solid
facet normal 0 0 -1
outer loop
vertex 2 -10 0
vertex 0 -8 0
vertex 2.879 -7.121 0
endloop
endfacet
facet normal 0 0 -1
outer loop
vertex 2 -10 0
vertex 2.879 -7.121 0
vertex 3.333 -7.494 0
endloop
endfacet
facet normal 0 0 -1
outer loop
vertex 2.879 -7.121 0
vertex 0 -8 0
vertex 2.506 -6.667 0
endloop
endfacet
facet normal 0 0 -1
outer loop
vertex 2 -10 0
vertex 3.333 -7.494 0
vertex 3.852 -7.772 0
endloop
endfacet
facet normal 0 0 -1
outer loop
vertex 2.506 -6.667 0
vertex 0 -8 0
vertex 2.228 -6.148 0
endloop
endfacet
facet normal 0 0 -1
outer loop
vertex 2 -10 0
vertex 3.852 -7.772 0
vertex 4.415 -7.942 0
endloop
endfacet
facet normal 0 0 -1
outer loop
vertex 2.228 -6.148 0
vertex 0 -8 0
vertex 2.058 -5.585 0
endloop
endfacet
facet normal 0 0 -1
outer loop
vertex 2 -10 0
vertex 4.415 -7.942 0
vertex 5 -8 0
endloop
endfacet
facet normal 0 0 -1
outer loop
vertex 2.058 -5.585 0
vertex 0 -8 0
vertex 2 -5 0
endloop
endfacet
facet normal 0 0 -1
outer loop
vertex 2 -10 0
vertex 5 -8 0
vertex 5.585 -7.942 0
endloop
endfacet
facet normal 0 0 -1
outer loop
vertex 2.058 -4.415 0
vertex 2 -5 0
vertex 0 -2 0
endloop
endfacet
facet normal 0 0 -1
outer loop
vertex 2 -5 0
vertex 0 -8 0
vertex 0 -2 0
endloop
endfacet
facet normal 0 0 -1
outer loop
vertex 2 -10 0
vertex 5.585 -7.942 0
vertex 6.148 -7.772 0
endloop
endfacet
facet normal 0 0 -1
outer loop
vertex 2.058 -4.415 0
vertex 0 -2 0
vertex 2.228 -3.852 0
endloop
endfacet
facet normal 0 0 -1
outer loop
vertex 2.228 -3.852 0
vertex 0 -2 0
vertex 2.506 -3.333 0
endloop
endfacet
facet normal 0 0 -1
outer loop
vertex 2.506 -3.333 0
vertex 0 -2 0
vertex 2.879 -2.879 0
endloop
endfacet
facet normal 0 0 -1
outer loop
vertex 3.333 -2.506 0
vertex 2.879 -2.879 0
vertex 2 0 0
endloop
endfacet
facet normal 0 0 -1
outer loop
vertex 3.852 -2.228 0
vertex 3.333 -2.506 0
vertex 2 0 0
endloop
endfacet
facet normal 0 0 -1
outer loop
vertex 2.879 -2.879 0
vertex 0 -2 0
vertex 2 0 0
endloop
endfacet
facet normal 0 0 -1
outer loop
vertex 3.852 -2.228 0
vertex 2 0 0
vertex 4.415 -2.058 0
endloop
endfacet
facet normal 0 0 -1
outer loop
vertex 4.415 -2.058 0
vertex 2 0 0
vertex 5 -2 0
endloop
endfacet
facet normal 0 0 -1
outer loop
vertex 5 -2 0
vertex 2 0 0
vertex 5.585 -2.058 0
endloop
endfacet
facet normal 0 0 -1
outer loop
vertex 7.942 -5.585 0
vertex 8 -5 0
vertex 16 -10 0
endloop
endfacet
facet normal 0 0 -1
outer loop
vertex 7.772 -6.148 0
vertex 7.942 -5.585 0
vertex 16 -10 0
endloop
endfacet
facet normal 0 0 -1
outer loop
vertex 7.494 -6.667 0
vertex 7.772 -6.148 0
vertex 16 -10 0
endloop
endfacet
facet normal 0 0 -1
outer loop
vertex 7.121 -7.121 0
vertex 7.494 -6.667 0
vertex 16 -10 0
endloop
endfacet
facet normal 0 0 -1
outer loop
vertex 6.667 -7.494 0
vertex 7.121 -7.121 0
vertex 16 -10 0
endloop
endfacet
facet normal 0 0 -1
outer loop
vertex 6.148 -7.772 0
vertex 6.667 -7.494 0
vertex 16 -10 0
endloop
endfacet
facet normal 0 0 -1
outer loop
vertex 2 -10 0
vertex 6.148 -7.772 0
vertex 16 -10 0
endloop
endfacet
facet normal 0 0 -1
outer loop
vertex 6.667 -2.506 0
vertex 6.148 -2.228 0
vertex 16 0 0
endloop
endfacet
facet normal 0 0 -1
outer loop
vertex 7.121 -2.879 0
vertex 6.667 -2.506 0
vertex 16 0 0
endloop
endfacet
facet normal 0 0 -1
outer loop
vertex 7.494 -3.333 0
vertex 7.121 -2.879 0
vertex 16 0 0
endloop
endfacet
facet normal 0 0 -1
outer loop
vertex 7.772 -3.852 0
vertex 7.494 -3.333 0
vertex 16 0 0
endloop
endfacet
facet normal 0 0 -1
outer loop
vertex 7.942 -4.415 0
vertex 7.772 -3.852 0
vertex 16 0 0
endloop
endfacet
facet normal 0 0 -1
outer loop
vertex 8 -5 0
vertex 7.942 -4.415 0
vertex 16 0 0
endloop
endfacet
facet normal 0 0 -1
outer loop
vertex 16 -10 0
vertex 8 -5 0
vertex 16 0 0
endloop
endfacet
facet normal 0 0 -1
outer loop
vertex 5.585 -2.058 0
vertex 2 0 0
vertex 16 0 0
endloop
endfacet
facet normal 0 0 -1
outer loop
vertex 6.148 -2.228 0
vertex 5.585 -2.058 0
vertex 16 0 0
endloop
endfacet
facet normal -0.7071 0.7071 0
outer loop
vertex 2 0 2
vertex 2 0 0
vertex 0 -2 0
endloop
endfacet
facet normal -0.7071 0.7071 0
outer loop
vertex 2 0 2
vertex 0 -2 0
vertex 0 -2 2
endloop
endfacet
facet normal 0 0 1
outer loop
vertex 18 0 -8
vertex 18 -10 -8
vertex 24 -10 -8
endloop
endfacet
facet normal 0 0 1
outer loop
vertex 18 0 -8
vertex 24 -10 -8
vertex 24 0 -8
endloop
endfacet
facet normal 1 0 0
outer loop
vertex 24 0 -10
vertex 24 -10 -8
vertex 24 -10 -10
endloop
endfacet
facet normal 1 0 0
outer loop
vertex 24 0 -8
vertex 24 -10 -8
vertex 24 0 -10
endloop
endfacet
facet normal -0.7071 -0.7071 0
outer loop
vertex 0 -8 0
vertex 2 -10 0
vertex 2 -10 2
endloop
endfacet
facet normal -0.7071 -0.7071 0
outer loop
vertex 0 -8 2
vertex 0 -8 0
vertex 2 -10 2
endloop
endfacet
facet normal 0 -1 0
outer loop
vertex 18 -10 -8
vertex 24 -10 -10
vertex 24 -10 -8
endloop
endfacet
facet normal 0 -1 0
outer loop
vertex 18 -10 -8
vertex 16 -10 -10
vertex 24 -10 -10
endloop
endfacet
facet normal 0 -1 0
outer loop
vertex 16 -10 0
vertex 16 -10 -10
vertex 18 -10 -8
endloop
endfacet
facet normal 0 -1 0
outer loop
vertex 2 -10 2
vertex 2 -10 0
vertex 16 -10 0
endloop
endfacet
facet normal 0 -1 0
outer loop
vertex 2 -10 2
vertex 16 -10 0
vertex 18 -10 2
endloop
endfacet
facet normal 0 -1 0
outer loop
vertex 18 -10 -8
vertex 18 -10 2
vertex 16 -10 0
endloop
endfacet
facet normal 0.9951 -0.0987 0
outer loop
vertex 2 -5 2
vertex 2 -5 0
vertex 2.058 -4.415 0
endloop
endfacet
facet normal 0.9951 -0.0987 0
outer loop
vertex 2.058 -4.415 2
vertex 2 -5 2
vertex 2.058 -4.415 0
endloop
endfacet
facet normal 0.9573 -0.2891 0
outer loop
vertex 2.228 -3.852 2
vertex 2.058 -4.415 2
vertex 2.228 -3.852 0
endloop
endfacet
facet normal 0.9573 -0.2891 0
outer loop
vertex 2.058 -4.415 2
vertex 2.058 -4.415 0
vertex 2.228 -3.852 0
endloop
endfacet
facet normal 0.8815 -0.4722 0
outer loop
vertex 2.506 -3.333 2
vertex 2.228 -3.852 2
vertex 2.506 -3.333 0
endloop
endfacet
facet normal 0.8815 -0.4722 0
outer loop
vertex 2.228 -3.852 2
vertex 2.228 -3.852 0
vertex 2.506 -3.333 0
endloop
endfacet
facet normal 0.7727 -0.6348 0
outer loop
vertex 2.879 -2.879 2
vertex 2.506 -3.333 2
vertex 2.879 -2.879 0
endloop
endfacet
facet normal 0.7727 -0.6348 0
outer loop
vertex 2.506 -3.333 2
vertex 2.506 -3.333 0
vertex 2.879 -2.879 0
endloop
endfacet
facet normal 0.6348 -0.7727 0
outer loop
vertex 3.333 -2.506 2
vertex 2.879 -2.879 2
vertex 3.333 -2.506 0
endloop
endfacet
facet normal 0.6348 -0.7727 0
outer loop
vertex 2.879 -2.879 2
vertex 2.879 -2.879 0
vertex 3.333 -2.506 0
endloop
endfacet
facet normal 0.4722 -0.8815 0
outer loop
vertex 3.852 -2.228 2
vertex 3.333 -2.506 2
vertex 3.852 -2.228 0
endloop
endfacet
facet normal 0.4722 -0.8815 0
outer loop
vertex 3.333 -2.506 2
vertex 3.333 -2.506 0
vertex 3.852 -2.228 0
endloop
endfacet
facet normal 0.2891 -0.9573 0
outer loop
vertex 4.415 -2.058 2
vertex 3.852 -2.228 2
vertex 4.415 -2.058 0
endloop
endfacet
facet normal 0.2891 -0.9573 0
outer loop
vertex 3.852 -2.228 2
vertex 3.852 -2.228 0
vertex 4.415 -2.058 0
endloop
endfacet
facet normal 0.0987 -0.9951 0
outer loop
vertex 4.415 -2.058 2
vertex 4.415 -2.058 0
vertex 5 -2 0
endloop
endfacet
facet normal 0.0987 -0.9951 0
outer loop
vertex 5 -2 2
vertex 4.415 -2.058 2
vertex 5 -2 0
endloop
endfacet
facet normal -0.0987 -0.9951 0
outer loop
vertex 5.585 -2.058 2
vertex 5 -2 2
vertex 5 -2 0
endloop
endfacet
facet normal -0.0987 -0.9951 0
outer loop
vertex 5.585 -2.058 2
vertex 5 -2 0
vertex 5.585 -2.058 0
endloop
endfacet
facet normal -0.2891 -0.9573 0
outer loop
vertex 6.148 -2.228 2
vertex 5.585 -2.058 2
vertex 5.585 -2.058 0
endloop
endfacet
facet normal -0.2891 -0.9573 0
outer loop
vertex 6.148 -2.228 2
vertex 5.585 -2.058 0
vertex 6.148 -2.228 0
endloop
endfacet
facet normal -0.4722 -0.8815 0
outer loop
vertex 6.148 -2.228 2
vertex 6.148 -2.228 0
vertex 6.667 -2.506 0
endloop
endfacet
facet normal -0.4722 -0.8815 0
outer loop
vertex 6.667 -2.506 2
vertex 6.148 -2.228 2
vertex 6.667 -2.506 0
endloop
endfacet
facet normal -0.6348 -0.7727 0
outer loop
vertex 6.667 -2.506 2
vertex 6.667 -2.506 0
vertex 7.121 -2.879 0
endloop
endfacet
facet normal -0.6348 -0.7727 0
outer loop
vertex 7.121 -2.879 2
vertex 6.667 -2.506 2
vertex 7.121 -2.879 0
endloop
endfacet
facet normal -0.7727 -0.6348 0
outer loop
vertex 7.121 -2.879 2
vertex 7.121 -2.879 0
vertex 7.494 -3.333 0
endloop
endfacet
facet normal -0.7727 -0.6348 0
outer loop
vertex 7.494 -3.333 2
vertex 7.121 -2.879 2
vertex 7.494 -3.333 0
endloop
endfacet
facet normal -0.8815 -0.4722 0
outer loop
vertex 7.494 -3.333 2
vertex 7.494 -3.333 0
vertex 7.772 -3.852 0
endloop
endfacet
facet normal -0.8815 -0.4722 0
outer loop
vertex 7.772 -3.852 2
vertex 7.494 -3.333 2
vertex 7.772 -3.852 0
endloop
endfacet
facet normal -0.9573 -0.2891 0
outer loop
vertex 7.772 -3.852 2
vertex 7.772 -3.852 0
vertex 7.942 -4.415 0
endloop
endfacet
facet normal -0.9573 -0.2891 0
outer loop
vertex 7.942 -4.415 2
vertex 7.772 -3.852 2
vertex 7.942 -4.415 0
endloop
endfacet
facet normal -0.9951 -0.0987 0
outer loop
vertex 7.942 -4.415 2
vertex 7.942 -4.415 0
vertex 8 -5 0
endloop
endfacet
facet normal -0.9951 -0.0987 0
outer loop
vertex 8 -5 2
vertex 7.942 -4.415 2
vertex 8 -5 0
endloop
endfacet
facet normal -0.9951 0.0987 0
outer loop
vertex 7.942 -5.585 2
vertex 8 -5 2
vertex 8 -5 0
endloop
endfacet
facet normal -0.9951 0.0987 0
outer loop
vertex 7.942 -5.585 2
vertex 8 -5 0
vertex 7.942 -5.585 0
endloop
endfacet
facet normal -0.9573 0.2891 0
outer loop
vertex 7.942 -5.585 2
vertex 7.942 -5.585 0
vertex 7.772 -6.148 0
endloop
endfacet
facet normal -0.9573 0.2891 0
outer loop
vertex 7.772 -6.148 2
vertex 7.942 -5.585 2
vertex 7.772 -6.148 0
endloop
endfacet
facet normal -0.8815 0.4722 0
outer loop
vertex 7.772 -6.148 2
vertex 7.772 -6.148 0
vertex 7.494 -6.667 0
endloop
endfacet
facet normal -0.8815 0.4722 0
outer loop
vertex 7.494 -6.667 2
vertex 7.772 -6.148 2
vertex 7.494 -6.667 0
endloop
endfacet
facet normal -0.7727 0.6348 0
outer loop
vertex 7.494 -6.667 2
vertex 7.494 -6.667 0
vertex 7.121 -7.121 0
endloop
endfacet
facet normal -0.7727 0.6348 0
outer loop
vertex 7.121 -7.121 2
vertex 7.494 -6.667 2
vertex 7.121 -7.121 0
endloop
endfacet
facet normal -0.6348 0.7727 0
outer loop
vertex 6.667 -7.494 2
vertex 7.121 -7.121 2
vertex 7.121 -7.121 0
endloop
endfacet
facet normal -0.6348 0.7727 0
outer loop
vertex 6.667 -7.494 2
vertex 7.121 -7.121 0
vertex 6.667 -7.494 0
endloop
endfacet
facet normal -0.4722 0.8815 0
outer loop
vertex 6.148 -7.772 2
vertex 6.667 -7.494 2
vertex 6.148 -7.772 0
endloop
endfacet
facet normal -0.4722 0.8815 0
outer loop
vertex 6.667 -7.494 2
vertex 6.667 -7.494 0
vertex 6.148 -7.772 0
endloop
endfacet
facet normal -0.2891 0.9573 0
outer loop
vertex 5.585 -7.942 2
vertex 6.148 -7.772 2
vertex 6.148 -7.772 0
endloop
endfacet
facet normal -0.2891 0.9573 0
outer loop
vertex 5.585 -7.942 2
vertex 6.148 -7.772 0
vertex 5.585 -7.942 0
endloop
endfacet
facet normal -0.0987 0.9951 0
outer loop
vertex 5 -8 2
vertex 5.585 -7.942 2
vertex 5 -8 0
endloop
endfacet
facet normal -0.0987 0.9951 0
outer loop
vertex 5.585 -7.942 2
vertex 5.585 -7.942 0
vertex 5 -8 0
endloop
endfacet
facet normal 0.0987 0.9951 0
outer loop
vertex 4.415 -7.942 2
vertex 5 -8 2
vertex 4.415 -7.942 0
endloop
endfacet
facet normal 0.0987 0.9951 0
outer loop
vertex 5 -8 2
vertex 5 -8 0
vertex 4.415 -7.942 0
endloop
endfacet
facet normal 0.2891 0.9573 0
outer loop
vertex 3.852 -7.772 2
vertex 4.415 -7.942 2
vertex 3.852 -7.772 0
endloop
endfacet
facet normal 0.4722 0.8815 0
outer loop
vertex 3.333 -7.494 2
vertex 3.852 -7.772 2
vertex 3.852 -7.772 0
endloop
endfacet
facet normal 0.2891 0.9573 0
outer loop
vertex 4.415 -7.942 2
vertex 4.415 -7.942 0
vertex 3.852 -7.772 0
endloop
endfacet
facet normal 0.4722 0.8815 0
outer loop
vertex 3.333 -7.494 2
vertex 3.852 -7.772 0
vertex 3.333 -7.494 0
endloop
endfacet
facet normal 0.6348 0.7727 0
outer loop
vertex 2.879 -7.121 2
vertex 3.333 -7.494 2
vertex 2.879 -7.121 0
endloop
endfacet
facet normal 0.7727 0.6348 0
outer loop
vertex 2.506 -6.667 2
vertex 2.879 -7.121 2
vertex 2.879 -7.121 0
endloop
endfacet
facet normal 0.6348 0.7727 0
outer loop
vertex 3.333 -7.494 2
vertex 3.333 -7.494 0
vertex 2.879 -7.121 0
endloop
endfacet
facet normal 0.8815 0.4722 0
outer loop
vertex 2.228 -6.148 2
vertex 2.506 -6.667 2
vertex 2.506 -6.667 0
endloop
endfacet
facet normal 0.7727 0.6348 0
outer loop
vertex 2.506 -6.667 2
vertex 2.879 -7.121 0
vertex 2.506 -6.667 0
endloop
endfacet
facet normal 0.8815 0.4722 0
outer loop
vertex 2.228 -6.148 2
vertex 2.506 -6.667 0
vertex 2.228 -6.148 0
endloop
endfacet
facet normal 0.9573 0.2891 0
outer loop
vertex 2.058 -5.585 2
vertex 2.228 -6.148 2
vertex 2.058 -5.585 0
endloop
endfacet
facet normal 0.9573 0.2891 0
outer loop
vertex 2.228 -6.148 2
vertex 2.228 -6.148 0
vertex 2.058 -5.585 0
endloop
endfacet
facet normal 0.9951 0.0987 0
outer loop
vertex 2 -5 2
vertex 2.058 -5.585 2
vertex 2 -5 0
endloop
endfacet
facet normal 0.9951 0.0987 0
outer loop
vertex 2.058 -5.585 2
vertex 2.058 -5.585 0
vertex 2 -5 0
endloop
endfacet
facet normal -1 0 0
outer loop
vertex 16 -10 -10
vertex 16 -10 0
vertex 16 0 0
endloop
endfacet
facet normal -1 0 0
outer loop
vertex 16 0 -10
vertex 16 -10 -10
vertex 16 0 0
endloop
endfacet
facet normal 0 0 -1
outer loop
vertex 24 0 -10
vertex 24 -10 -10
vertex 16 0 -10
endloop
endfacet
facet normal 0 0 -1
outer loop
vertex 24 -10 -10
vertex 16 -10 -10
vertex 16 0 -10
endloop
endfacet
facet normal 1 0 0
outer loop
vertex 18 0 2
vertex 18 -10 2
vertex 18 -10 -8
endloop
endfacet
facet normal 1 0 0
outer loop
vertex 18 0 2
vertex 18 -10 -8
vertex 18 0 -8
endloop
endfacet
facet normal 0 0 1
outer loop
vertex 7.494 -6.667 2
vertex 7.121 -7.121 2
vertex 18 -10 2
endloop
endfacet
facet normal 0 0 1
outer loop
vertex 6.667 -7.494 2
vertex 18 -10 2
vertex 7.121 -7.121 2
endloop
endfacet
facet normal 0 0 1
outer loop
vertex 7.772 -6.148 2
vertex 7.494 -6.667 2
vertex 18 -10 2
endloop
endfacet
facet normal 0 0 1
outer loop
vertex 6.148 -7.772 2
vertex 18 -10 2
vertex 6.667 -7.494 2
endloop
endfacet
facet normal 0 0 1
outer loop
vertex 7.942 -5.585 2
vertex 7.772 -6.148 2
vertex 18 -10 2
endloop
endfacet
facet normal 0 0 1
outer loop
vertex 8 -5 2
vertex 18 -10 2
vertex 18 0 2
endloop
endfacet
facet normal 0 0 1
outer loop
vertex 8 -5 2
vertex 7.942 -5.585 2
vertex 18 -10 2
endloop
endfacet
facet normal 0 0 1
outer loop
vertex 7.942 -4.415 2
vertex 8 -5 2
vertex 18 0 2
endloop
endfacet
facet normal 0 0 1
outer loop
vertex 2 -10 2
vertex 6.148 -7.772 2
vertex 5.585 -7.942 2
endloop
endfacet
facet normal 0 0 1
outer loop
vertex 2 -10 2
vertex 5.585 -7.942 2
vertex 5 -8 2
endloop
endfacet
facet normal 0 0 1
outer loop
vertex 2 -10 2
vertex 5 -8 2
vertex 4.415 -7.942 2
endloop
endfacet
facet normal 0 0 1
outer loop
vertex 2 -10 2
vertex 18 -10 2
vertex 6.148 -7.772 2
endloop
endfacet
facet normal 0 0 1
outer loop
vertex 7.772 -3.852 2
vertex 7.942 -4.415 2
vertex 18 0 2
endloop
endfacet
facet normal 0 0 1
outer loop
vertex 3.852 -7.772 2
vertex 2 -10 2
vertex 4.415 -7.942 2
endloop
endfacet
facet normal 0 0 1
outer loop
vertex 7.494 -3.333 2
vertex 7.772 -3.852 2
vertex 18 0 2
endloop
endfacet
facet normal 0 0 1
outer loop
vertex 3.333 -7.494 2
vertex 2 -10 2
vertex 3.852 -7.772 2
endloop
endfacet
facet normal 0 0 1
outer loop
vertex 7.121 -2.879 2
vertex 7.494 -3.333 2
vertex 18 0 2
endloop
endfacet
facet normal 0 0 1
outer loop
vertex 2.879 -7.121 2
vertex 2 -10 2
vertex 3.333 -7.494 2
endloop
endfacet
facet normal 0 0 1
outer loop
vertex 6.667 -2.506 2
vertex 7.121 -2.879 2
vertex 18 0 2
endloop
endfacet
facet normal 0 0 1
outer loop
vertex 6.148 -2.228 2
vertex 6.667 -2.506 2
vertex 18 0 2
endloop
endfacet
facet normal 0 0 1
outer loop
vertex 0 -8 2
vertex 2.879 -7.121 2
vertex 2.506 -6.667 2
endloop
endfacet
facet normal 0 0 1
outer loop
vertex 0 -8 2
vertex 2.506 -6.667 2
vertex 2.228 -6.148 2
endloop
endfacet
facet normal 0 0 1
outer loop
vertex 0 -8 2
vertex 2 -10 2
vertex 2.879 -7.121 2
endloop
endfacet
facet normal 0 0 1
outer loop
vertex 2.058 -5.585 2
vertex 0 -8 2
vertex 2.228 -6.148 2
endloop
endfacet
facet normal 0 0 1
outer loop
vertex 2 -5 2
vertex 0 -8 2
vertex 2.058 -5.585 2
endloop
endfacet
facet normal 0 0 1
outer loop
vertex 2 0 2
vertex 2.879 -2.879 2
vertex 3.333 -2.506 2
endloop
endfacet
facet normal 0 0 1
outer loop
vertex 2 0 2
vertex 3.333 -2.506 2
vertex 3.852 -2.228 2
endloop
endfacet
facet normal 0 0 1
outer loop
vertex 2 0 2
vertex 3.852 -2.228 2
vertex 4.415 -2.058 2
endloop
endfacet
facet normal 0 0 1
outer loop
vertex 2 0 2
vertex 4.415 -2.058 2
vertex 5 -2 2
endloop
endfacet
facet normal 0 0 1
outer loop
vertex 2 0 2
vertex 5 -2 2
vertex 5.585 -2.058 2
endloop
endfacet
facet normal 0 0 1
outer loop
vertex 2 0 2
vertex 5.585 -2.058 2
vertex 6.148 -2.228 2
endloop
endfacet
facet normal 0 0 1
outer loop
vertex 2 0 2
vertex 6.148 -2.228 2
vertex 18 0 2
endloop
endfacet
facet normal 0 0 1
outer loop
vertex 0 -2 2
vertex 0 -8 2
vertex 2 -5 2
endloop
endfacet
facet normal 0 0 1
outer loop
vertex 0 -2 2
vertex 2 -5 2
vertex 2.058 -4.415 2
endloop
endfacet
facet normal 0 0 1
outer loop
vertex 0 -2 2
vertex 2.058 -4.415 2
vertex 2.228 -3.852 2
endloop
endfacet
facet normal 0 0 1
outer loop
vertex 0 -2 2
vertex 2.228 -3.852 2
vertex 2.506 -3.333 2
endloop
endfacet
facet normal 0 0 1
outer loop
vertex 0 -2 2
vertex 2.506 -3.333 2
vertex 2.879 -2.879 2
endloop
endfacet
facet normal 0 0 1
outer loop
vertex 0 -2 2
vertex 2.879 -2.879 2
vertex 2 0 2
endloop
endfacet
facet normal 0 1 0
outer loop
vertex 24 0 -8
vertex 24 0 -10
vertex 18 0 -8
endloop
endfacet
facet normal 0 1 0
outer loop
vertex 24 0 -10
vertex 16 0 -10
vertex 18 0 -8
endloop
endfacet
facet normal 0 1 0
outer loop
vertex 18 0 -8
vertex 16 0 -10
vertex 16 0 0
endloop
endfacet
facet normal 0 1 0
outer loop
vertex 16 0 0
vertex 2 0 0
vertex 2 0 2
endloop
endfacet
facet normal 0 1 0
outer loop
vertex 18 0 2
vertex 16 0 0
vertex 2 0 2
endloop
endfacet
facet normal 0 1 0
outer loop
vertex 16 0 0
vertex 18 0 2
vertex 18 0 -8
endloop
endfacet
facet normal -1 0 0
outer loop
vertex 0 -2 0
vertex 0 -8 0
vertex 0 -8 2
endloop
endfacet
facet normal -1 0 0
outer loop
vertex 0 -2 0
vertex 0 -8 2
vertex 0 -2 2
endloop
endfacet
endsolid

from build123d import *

# Parameters (mm, degrees)
F0_W      = 16
F0_H      = 10
F1_DEPTH  = 2
F2_SIZE   = 2
F7_D      = 6
F8_W      = 10
F8_H      = 2
F8_H_2    = 10
F9_DEPTH  = 2
F10_W     = 10
F10_H     = 2
F11_DEPTH = 6


with BuildPart() as f1:
    # F0 (on Top) → F1 (new body)
    with BuildSketch(Plane.XY):
        with Locations((8, -5)):
            Rectangle(F0_W, F0_H)
    extrude(amount=F1_DEPTH)

    # F2
    f2_edges = [f1.edges().sort_by_distance(p)[0] for p in [
        (0, -10, 1),
        (0, 0, 1),
    ]]
    chamfer(f2_edges, length=F2_SIZE)

    # F7 (through all)
    with Locations(Plane.XY.offset(2)):
        with Locations((5, -5)):
            Hole(F7_D / 2)

    # F8 (on face) → F9 (join)
    with BuildSketch(Plane.YZ.offset(16)):
        with Locations((-5, 1)):
            Rectangle(F8_W, F8_H)
        with Locations((-5, -5)):
            Rectangle(F8_W, F8_H_2)
    extrude(amount=F9_DEPTH)

    # F10 (on face) → F11 (join)
    with BuildSketch(Plane.YZ.offset(18)):
        with Locations((-5, -9)):
            Rectangle(F10_W, F10_H)
    extrude(amount=F11_DEPTH)


solid = f1.part
